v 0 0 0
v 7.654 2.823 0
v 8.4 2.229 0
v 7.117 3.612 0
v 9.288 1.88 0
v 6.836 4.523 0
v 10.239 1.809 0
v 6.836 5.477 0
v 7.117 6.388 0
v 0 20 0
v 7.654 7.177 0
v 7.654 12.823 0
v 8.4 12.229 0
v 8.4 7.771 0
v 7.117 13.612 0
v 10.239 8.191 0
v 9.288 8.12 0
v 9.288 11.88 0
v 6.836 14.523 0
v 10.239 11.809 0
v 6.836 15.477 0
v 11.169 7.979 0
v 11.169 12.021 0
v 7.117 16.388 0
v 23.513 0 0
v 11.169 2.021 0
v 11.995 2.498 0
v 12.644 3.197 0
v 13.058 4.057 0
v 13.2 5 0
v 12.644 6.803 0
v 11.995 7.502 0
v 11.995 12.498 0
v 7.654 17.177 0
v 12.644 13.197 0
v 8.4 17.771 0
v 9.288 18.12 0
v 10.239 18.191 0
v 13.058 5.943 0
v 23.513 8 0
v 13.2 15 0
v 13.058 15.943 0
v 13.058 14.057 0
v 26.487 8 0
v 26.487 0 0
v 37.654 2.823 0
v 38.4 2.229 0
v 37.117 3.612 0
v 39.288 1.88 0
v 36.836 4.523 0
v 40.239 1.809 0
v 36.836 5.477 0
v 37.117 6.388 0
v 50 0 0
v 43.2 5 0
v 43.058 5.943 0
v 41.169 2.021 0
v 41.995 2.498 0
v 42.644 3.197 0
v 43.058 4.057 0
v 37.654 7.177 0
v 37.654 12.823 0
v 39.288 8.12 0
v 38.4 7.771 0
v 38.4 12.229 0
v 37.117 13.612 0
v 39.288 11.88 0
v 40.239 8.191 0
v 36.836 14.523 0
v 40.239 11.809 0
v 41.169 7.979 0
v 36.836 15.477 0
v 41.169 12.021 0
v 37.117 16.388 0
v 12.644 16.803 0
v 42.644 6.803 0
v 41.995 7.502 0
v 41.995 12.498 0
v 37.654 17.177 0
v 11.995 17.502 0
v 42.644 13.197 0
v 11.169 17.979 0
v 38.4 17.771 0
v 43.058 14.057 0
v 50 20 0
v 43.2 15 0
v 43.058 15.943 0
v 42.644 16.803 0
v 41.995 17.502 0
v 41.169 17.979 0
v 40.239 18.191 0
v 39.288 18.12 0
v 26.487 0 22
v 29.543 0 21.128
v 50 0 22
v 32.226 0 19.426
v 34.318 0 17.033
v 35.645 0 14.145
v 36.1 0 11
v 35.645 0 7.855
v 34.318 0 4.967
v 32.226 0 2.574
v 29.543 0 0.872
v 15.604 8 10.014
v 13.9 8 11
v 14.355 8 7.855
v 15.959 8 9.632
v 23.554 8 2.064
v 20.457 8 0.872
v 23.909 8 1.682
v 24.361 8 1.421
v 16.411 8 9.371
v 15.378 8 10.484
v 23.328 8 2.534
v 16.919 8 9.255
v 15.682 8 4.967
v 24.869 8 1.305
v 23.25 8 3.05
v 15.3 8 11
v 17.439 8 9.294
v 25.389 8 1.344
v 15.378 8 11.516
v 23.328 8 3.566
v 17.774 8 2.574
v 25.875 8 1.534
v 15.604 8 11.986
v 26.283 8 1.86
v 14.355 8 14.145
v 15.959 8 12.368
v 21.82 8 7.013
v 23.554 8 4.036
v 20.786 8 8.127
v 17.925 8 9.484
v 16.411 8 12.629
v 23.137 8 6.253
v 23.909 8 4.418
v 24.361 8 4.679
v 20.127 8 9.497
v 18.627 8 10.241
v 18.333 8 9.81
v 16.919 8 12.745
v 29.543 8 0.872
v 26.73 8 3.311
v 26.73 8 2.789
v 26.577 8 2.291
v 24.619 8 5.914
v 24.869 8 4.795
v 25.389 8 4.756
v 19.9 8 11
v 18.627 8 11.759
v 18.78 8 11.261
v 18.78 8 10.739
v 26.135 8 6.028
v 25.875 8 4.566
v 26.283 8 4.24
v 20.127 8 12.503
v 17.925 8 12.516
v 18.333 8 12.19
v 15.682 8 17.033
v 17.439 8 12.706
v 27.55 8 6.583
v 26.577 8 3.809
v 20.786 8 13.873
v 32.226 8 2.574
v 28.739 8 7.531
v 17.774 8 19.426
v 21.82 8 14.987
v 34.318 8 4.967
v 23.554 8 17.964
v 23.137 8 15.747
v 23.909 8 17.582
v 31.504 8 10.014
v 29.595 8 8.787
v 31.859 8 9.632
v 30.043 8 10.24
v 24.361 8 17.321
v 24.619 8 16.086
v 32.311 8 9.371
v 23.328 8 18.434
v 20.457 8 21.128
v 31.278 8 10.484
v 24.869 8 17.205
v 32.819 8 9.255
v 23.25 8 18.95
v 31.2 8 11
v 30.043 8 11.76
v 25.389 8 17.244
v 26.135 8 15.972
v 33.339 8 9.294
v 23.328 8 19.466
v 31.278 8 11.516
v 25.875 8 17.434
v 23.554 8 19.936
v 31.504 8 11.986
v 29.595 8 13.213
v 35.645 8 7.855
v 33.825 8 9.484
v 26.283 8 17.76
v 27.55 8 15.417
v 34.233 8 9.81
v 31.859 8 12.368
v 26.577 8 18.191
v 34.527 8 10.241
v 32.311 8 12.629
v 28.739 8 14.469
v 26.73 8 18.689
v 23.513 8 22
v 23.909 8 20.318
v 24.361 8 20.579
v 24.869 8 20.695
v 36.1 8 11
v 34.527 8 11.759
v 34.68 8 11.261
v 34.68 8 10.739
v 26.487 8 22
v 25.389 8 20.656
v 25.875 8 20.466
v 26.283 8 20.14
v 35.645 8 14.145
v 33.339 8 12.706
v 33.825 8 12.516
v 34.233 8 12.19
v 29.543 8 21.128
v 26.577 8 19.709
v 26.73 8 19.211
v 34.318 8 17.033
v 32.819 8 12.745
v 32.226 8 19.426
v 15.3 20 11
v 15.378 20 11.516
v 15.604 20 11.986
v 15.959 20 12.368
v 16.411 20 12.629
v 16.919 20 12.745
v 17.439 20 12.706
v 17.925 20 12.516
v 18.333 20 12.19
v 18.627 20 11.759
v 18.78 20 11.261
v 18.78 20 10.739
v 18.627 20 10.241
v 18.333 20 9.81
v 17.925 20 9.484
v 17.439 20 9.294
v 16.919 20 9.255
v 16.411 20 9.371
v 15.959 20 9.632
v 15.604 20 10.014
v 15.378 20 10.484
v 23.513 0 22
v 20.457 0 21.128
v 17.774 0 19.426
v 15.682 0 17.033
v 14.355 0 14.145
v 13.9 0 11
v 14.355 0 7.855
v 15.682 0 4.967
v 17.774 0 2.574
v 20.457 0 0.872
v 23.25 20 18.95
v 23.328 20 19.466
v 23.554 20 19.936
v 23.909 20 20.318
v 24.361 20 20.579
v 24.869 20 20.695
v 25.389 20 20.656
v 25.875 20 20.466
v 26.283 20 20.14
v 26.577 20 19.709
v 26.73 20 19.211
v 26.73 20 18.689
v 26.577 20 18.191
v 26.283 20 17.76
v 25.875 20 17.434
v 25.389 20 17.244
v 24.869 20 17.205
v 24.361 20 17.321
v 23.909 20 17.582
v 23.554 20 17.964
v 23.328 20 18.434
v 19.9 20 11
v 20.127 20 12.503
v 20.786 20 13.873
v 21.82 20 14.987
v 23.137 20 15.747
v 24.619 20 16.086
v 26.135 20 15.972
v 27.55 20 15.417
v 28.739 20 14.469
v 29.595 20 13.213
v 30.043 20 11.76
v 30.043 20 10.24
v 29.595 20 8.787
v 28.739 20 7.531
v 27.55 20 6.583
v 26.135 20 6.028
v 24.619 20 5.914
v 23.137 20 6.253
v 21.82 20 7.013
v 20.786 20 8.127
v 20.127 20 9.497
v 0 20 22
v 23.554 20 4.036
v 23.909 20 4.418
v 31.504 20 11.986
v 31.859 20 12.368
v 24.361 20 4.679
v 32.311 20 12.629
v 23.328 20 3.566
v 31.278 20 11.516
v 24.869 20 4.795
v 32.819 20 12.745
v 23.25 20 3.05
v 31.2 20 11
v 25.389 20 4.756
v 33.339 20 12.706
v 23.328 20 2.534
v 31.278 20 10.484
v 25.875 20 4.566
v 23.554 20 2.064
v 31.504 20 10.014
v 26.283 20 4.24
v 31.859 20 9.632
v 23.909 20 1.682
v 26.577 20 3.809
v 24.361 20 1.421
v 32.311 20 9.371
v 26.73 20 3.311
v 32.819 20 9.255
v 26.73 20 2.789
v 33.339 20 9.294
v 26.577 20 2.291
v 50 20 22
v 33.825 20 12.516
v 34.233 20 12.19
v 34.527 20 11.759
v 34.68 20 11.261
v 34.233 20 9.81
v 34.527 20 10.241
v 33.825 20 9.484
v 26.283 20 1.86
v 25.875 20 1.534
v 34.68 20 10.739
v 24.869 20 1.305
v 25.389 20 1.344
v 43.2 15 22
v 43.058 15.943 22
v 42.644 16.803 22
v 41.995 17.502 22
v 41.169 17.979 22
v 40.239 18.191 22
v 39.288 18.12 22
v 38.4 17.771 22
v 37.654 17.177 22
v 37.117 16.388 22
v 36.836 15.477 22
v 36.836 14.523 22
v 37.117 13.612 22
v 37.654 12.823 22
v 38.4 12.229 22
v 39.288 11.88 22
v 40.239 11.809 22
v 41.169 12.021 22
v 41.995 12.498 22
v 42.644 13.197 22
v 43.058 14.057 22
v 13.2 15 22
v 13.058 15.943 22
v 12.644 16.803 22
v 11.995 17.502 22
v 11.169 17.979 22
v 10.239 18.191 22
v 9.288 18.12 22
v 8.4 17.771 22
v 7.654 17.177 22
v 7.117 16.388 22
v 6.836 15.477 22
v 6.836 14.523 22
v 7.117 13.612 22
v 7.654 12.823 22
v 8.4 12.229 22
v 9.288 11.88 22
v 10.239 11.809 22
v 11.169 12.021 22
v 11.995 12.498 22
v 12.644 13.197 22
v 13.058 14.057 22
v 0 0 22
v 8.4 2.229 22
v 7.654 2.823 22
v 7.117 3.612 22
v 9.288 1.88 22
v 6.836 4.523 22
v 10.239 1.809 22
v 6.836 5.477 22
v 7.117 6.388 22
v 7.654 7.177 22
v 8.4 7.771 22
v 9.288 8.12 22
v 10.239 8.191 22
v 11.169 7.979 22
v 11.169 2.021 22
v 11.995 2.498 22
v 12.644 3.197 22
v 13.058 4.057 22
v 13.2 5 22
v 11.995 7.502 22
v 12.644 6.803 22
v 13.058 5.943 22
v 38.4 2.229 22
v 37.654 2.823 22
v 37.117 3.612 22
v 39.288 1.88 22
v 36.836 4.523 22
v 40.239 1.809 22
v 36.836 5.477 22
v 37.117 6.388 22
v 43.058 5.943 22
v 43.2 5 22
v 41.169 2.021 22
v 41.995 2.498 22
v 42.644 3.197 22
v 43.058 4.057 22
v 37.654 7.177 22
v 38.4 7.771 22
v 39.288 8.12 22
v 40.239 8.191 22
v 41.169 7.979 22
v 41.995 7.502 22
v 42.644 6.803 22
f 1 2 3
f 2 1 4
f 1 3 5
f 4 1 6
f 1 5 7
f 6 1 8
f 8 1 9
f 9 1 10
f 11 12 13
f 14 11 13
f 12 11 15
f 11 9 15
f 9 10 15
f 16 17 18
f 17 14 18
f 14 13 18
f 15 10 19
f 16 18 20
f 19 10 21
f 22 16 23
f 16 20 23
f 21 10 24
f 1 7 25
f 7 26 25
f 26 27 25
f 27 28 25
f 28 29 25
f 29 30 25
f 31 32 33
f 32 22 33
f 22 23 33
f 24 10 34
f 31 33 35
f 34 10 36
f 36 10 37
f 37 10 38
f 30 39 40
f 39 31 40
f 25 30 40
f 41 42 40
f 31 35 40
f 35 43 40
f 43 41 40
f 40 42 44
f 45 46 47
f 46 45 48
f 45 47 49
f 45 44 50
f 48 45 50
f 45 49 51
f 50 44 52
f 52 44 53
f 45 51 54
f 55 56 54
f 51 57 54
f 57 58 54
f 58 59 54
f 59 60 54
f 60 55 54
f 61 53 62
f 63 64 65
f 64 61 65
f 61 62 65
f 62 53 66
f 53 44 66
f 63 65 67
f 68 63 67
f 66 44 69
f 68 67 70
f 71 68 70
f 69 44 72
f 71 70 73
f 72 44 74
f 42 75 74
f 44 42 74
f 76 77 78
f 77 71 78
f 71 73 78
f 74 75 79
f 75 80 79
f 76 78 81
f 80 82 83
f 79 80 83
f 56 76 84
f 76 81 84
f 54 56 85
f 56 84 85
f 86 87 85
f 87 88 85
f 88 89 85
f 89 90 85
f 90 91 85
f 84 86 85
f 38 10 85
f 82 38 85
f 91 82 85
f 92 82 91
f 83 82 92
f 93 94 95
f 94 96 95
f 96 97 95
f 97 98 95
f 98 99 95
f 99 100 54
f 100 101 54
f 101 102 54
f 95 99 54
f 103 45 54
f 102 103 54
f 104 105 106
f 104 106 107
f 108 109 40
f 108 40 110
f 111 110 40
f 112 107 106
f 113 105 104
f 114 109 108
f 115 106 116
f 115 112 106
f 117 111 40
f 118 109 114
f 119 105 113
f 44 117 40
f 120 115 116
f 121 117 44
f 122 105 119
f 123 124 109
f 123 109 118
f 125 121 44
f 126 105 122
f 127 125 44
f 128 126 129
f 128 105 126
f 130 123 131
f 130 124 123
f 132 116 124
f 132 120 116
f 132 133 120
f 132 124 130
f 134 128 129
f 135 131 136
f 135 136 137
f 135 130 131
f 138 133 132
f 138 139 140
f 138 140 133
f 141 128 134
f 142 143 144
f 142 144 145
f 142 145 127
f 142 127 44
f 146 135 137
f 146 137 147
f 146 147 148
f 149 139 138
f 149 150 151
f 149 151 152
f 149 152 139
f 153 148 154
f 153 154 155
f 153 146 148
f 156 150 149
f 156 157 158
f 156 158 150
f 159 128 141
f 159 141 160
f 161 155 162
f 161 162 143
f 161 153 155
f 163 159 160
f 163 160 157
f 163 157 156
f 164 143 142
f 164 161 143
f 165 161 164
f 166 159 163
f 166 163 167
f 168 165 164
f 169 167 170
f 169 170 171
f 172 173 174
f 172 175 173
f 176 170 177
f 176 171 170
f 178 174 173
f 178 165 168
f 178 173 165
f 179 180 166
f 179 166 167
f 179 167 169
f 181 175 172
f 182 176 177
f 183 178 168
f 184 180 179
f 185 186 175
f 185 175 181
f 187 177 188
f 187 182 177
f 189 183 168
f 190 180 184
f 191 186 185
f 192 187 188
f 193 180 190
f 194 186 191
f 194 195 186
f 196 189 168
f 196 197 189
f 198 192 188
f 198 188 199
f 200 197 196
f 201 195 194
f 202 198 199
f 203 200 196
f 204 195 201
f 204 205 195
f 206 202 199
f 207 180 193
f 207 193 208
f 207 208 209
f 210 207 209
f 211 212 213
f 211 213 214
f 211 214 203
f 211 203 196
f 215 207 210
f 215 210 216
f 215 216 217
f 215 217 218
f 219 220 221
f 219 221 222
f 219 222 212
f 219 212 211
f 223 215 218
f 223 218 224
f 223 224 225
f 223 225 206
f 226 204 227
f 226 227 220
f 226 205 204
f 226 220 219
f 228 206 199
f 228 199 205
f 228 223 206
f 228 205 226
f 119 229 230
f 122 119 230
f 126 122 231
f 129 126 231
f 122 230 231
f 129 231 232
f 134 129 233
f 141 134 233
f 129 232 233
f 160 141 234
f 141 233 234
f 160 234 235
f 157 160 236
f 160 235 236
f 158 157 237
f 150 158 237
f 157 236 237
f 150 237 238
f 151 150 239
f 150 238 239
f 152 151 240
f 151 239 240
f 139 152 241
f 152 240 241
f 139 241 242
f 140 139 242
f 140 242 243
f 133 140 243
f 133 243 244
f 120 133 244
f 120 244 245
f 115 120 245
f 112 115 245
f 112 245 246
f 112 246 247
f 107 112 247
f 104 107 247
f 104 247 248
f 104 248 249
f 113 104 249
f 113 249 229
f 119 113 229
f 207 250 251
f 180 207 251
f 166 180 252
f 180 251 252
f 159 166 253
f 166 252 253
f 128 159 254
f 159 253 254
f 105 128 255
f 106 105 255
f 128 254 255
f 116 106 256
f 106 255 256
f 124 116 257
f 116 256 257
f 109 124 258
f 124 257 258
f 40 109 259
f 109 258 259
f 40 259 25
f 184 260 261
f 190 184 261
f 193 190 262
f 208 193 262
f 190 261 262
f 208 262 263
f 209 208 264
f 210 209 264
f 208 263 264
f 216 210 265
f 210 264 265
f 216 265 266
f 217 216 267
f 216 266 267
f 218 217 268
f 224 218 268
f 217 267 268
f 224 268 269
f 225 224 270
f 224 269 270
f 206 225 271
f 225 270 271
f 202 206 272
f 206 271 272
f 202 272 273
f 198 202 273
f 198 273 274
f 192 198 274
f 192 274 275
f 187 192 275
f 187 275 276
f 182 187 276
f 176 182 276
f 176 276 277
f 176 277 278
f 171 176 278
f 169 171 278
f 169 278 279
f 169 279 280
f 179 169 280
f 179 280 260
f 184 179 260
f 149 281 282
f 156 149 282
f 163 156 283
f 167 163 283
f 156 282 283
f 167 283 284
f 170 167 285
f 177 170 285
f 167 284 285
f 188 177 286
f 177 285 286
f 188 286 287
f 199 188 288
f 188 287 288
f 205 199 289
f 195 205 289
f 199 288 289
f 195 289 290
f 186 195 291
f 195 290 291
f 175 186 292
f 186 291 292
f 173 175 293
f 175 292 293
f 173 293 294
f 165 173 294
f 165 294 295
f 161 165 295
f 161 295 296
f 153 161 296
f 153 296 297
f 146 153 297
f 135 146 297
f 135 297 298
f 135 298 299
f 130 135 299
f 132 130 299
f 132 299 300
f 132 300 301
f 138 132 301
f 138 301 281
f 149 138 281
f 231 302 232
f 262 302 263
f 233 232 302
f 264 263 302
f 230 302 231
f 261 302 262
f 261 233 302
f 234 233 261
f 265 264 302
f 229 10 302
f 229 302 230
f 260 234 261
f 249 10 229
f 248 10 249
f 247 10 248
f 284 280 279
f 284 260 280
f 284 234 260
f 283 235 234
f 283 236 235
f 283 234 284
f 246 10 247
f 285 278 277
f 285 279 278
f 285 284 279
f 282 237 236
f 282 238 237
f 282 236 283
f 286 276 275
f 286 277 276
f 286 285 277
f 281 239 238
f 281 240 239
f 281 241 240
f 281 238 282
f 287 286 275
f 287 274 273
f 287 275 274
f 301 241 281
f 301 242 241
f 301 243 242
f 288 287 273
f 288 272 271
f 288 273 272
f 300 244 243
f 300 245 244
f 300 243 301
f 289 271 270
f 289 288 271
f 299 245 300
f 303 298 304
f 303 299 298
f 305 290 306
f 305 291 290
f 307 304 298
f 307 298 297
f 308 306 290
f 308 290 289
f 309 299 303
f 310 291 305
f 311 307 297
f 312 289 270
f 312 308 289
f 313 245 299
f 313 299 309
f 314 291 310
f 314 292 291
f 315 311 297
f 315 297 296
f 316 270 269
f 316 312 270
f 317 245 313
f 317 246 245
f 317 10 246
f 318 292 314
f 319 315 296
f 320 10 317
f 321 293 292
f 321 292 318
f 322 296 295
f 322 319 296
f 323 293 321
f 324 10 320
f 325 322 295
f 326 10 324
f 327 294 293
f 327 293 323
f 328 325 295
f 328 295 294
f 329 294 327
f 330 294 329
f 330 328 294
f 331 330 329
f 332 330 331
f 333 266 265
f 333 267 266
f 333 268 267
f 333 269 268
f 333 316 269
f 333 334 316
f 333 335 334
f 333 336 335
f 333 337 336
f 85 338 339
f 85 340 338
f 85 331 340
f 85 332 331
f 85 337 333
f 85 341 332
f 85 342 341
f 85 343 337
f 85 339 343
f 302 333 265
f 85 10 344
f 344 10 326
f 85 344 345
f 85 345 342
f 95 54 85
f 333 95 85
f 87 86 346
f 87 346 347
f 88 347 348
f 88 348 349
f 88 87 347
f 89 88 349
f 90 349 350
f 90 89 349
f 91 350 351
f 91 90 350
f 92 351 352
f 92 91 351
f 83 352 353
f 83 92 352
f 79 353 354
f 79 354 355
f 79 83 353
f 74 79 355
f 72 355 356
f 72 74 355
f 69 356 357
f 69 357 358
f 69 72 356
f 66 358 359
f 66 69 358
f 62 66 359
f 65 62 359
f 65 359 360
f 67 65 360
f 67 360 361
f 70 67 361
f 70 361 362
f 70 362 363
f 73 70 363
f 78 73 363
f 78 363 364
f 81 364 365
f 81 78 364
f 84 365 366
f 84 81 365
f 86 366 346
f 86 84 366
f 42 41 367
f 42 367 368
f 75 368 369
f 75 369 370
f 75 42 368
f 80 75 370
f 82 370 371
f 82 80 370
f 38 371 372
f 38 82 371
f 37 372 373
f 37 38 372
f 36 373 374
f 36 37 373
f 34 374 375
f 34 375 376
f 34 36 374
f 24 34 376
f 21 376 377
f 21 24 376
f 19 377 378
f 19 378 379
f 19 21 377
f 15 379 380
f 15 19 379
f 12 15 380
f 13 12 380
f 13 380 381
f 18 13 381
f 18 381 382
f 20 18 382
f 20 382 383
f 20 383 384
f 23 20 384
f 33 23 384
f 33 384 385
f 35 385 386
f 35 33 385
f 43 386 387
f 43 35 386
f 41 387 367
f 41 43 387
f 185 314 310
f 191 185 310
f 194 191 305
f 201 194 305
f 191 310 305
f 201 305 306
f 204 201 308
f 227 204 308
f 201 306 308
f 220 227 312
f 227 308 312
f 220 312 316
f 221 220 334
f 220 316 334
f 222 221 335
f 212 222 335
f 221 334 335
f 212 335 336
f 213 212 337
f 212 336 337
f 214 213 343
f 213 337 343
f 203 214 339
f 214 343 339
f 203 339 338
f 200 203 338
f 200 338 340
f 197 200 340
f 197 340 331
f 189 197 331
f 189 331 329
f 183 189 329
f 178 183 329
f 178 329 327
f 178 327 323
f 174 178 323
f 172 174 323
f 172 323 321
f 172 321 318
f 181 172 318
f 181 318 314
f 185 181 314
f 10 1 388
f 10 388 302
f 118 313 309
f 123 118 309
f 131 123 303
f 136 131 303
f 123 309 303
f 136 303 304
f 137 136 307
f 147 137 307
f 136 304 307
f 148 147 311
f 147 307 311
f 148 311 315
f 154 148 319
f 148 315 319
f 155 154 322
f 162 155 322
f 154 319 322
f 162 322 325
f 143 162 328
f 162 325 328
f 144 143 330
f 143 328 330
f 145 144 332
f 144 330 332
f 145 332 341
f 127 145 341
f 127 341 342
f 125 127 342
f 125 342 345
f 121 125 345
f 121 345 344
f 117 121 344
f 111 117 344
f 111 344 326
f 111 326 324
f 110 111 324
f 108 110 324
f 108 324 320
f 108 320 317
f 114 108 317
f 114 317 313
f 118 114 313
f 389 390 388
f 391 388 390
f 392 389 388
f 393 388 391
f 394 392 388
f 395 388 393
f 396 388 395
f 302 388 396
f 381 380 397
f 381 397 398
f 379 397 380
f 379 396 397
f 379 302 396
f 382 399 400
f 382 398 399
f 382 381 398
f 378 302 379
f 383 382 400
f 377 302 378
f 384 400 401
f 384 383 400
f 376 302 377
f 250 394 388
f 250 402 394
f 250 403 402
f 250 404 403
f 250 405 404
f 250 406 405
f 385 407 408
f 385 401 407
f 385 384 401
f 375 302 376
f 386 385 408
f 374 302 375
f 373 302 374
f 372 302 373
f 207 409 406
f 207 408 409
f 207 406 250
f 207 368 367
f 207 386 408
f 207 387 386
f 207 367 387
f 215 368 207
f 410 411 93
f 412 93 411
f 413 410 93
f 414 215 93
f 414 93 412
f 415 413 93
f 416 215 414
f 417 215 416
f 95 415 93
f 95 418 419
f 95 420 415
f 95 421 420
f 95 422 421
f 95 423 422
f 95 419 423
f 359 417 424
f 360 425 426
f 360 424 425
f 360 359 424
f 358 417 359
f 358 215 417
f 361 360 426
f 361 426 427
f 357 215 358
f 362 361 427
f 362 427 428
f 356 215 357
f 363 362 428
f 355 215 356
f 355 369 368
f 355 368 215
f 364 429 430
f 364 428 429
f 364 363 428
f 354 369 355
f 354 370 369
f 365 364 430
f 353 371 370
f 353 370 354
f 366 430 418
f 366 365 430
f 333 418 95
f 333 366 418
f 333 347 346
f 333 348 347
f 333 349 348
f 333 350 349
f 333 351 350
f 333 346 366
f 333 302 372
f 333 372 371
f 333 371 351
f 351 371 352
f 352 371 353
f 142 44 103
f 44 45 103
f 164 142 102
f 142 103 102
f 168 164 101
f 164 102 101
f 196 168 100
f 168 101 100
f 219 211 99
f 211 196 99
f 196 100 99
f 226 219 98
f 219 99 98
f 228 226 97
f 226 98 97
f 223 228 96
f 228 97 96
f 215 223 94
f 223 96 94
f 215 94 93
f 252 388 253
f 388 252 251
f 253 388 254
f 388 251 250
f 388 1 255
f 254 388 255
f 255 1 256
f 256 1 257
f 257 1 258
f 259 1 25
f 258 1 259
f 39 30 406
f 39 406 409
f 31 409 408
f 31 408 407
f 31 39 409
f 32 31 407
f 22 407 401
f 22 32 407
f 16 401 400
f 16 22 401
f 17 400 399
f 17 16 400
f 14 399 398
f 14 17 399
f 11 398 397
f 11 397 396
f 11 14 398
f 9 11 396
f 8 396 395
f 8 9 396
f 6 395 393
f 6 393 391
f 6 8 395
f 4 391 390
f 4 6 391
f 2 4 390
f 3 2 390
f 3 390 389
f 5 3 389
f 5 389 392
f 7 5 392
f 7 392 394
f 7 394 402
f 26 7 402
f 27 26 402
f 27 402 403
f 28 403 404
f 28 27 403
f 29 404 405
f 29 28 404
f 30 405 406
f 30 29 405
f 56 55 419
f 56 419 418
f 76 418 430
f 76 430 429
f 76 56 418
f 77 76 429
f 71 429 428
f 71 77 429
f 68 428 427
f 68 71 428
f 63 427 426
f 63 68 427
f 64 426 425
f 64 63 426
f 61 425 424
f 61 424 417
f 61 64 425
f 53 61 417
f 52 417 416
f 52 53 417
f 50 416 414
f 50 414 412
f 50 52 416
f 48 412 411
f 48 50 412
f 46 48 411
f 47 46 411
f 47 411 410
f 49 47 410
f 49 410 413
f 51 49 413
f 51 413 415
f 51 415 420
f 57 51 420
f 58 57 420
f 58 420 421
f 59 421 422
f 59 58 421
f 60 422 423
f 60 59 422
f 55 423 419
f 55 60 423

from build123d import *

# Parameters (mm, degrees)
SKETCH_W        = 50
SKETCH_H        = 20
SKETCH_R        = 3.2
PAD_DEPTH       = 22
SKETCH001_R     = 11.1
POCKET_DEPTH    = 8
SKETCH002_R     = 5.1
SKETCH002_R_2   = 1.75
POCKET001_DEPTH = 20


with BuildPart() as part:
    # Sketch → Pad (new body)
    with BuildSketch(Plane.XY):
        with Locations((25, 10)):
            Rectangle(SKETCH_W, SKETCH_H)
        with Locations((10, 15)):
            Circle(SKETCH_R, mode=Mode.SUBTRACT)
        with Locations((10, 5)):
            Circle(SKETCH_R, mode=Mode.SUBTRACT)
        with Locations((40, 15)):
            Circle(SKETCH_R, mode=Mode.SUBTRACT)
        with Locations((40, 5)):
            Circle(SKETCH_R, mode=Mode.SUBTRACT)
    extrude(amount=PAD_DEPTH)

    # Sketch001 (on Face3 of Pad) → Pocket (cut)
    with BuildSketch(Plane.XZ):
        with Locations((25, 11)):
            Circle(SKETCH001_R)
    extrude(amount=-POCKET_DEPTH, mode=Mode.SUBTRACT)

    # Sketch002 (on Face1 of Pocket) → Pocket001 (cut)
    with BuildSketch(Plane(origin=(0, 20, 0), x_dir=(-1, 0, 0), z_dir=(0, 1, 0))):
        with Locations((-25, 11)):
            Circle(SKETCH002_R)
        with Locations((-25, 18.95)):
            Circle(SKETCH002_R_2)
        with Locations((-25, 3.05)):
            Circle(SKETCH002_R_2)
        with Locations((-32.95, 11)):
            Circle(SKETCH002_R_2)
        with Locations((-17.05, 11)):
            Circle(SKETCH002_R_2)
    extrude(amount=-POCKET001_DEPTH, mode=Mode.SUBTRACT)


solid = part.part
